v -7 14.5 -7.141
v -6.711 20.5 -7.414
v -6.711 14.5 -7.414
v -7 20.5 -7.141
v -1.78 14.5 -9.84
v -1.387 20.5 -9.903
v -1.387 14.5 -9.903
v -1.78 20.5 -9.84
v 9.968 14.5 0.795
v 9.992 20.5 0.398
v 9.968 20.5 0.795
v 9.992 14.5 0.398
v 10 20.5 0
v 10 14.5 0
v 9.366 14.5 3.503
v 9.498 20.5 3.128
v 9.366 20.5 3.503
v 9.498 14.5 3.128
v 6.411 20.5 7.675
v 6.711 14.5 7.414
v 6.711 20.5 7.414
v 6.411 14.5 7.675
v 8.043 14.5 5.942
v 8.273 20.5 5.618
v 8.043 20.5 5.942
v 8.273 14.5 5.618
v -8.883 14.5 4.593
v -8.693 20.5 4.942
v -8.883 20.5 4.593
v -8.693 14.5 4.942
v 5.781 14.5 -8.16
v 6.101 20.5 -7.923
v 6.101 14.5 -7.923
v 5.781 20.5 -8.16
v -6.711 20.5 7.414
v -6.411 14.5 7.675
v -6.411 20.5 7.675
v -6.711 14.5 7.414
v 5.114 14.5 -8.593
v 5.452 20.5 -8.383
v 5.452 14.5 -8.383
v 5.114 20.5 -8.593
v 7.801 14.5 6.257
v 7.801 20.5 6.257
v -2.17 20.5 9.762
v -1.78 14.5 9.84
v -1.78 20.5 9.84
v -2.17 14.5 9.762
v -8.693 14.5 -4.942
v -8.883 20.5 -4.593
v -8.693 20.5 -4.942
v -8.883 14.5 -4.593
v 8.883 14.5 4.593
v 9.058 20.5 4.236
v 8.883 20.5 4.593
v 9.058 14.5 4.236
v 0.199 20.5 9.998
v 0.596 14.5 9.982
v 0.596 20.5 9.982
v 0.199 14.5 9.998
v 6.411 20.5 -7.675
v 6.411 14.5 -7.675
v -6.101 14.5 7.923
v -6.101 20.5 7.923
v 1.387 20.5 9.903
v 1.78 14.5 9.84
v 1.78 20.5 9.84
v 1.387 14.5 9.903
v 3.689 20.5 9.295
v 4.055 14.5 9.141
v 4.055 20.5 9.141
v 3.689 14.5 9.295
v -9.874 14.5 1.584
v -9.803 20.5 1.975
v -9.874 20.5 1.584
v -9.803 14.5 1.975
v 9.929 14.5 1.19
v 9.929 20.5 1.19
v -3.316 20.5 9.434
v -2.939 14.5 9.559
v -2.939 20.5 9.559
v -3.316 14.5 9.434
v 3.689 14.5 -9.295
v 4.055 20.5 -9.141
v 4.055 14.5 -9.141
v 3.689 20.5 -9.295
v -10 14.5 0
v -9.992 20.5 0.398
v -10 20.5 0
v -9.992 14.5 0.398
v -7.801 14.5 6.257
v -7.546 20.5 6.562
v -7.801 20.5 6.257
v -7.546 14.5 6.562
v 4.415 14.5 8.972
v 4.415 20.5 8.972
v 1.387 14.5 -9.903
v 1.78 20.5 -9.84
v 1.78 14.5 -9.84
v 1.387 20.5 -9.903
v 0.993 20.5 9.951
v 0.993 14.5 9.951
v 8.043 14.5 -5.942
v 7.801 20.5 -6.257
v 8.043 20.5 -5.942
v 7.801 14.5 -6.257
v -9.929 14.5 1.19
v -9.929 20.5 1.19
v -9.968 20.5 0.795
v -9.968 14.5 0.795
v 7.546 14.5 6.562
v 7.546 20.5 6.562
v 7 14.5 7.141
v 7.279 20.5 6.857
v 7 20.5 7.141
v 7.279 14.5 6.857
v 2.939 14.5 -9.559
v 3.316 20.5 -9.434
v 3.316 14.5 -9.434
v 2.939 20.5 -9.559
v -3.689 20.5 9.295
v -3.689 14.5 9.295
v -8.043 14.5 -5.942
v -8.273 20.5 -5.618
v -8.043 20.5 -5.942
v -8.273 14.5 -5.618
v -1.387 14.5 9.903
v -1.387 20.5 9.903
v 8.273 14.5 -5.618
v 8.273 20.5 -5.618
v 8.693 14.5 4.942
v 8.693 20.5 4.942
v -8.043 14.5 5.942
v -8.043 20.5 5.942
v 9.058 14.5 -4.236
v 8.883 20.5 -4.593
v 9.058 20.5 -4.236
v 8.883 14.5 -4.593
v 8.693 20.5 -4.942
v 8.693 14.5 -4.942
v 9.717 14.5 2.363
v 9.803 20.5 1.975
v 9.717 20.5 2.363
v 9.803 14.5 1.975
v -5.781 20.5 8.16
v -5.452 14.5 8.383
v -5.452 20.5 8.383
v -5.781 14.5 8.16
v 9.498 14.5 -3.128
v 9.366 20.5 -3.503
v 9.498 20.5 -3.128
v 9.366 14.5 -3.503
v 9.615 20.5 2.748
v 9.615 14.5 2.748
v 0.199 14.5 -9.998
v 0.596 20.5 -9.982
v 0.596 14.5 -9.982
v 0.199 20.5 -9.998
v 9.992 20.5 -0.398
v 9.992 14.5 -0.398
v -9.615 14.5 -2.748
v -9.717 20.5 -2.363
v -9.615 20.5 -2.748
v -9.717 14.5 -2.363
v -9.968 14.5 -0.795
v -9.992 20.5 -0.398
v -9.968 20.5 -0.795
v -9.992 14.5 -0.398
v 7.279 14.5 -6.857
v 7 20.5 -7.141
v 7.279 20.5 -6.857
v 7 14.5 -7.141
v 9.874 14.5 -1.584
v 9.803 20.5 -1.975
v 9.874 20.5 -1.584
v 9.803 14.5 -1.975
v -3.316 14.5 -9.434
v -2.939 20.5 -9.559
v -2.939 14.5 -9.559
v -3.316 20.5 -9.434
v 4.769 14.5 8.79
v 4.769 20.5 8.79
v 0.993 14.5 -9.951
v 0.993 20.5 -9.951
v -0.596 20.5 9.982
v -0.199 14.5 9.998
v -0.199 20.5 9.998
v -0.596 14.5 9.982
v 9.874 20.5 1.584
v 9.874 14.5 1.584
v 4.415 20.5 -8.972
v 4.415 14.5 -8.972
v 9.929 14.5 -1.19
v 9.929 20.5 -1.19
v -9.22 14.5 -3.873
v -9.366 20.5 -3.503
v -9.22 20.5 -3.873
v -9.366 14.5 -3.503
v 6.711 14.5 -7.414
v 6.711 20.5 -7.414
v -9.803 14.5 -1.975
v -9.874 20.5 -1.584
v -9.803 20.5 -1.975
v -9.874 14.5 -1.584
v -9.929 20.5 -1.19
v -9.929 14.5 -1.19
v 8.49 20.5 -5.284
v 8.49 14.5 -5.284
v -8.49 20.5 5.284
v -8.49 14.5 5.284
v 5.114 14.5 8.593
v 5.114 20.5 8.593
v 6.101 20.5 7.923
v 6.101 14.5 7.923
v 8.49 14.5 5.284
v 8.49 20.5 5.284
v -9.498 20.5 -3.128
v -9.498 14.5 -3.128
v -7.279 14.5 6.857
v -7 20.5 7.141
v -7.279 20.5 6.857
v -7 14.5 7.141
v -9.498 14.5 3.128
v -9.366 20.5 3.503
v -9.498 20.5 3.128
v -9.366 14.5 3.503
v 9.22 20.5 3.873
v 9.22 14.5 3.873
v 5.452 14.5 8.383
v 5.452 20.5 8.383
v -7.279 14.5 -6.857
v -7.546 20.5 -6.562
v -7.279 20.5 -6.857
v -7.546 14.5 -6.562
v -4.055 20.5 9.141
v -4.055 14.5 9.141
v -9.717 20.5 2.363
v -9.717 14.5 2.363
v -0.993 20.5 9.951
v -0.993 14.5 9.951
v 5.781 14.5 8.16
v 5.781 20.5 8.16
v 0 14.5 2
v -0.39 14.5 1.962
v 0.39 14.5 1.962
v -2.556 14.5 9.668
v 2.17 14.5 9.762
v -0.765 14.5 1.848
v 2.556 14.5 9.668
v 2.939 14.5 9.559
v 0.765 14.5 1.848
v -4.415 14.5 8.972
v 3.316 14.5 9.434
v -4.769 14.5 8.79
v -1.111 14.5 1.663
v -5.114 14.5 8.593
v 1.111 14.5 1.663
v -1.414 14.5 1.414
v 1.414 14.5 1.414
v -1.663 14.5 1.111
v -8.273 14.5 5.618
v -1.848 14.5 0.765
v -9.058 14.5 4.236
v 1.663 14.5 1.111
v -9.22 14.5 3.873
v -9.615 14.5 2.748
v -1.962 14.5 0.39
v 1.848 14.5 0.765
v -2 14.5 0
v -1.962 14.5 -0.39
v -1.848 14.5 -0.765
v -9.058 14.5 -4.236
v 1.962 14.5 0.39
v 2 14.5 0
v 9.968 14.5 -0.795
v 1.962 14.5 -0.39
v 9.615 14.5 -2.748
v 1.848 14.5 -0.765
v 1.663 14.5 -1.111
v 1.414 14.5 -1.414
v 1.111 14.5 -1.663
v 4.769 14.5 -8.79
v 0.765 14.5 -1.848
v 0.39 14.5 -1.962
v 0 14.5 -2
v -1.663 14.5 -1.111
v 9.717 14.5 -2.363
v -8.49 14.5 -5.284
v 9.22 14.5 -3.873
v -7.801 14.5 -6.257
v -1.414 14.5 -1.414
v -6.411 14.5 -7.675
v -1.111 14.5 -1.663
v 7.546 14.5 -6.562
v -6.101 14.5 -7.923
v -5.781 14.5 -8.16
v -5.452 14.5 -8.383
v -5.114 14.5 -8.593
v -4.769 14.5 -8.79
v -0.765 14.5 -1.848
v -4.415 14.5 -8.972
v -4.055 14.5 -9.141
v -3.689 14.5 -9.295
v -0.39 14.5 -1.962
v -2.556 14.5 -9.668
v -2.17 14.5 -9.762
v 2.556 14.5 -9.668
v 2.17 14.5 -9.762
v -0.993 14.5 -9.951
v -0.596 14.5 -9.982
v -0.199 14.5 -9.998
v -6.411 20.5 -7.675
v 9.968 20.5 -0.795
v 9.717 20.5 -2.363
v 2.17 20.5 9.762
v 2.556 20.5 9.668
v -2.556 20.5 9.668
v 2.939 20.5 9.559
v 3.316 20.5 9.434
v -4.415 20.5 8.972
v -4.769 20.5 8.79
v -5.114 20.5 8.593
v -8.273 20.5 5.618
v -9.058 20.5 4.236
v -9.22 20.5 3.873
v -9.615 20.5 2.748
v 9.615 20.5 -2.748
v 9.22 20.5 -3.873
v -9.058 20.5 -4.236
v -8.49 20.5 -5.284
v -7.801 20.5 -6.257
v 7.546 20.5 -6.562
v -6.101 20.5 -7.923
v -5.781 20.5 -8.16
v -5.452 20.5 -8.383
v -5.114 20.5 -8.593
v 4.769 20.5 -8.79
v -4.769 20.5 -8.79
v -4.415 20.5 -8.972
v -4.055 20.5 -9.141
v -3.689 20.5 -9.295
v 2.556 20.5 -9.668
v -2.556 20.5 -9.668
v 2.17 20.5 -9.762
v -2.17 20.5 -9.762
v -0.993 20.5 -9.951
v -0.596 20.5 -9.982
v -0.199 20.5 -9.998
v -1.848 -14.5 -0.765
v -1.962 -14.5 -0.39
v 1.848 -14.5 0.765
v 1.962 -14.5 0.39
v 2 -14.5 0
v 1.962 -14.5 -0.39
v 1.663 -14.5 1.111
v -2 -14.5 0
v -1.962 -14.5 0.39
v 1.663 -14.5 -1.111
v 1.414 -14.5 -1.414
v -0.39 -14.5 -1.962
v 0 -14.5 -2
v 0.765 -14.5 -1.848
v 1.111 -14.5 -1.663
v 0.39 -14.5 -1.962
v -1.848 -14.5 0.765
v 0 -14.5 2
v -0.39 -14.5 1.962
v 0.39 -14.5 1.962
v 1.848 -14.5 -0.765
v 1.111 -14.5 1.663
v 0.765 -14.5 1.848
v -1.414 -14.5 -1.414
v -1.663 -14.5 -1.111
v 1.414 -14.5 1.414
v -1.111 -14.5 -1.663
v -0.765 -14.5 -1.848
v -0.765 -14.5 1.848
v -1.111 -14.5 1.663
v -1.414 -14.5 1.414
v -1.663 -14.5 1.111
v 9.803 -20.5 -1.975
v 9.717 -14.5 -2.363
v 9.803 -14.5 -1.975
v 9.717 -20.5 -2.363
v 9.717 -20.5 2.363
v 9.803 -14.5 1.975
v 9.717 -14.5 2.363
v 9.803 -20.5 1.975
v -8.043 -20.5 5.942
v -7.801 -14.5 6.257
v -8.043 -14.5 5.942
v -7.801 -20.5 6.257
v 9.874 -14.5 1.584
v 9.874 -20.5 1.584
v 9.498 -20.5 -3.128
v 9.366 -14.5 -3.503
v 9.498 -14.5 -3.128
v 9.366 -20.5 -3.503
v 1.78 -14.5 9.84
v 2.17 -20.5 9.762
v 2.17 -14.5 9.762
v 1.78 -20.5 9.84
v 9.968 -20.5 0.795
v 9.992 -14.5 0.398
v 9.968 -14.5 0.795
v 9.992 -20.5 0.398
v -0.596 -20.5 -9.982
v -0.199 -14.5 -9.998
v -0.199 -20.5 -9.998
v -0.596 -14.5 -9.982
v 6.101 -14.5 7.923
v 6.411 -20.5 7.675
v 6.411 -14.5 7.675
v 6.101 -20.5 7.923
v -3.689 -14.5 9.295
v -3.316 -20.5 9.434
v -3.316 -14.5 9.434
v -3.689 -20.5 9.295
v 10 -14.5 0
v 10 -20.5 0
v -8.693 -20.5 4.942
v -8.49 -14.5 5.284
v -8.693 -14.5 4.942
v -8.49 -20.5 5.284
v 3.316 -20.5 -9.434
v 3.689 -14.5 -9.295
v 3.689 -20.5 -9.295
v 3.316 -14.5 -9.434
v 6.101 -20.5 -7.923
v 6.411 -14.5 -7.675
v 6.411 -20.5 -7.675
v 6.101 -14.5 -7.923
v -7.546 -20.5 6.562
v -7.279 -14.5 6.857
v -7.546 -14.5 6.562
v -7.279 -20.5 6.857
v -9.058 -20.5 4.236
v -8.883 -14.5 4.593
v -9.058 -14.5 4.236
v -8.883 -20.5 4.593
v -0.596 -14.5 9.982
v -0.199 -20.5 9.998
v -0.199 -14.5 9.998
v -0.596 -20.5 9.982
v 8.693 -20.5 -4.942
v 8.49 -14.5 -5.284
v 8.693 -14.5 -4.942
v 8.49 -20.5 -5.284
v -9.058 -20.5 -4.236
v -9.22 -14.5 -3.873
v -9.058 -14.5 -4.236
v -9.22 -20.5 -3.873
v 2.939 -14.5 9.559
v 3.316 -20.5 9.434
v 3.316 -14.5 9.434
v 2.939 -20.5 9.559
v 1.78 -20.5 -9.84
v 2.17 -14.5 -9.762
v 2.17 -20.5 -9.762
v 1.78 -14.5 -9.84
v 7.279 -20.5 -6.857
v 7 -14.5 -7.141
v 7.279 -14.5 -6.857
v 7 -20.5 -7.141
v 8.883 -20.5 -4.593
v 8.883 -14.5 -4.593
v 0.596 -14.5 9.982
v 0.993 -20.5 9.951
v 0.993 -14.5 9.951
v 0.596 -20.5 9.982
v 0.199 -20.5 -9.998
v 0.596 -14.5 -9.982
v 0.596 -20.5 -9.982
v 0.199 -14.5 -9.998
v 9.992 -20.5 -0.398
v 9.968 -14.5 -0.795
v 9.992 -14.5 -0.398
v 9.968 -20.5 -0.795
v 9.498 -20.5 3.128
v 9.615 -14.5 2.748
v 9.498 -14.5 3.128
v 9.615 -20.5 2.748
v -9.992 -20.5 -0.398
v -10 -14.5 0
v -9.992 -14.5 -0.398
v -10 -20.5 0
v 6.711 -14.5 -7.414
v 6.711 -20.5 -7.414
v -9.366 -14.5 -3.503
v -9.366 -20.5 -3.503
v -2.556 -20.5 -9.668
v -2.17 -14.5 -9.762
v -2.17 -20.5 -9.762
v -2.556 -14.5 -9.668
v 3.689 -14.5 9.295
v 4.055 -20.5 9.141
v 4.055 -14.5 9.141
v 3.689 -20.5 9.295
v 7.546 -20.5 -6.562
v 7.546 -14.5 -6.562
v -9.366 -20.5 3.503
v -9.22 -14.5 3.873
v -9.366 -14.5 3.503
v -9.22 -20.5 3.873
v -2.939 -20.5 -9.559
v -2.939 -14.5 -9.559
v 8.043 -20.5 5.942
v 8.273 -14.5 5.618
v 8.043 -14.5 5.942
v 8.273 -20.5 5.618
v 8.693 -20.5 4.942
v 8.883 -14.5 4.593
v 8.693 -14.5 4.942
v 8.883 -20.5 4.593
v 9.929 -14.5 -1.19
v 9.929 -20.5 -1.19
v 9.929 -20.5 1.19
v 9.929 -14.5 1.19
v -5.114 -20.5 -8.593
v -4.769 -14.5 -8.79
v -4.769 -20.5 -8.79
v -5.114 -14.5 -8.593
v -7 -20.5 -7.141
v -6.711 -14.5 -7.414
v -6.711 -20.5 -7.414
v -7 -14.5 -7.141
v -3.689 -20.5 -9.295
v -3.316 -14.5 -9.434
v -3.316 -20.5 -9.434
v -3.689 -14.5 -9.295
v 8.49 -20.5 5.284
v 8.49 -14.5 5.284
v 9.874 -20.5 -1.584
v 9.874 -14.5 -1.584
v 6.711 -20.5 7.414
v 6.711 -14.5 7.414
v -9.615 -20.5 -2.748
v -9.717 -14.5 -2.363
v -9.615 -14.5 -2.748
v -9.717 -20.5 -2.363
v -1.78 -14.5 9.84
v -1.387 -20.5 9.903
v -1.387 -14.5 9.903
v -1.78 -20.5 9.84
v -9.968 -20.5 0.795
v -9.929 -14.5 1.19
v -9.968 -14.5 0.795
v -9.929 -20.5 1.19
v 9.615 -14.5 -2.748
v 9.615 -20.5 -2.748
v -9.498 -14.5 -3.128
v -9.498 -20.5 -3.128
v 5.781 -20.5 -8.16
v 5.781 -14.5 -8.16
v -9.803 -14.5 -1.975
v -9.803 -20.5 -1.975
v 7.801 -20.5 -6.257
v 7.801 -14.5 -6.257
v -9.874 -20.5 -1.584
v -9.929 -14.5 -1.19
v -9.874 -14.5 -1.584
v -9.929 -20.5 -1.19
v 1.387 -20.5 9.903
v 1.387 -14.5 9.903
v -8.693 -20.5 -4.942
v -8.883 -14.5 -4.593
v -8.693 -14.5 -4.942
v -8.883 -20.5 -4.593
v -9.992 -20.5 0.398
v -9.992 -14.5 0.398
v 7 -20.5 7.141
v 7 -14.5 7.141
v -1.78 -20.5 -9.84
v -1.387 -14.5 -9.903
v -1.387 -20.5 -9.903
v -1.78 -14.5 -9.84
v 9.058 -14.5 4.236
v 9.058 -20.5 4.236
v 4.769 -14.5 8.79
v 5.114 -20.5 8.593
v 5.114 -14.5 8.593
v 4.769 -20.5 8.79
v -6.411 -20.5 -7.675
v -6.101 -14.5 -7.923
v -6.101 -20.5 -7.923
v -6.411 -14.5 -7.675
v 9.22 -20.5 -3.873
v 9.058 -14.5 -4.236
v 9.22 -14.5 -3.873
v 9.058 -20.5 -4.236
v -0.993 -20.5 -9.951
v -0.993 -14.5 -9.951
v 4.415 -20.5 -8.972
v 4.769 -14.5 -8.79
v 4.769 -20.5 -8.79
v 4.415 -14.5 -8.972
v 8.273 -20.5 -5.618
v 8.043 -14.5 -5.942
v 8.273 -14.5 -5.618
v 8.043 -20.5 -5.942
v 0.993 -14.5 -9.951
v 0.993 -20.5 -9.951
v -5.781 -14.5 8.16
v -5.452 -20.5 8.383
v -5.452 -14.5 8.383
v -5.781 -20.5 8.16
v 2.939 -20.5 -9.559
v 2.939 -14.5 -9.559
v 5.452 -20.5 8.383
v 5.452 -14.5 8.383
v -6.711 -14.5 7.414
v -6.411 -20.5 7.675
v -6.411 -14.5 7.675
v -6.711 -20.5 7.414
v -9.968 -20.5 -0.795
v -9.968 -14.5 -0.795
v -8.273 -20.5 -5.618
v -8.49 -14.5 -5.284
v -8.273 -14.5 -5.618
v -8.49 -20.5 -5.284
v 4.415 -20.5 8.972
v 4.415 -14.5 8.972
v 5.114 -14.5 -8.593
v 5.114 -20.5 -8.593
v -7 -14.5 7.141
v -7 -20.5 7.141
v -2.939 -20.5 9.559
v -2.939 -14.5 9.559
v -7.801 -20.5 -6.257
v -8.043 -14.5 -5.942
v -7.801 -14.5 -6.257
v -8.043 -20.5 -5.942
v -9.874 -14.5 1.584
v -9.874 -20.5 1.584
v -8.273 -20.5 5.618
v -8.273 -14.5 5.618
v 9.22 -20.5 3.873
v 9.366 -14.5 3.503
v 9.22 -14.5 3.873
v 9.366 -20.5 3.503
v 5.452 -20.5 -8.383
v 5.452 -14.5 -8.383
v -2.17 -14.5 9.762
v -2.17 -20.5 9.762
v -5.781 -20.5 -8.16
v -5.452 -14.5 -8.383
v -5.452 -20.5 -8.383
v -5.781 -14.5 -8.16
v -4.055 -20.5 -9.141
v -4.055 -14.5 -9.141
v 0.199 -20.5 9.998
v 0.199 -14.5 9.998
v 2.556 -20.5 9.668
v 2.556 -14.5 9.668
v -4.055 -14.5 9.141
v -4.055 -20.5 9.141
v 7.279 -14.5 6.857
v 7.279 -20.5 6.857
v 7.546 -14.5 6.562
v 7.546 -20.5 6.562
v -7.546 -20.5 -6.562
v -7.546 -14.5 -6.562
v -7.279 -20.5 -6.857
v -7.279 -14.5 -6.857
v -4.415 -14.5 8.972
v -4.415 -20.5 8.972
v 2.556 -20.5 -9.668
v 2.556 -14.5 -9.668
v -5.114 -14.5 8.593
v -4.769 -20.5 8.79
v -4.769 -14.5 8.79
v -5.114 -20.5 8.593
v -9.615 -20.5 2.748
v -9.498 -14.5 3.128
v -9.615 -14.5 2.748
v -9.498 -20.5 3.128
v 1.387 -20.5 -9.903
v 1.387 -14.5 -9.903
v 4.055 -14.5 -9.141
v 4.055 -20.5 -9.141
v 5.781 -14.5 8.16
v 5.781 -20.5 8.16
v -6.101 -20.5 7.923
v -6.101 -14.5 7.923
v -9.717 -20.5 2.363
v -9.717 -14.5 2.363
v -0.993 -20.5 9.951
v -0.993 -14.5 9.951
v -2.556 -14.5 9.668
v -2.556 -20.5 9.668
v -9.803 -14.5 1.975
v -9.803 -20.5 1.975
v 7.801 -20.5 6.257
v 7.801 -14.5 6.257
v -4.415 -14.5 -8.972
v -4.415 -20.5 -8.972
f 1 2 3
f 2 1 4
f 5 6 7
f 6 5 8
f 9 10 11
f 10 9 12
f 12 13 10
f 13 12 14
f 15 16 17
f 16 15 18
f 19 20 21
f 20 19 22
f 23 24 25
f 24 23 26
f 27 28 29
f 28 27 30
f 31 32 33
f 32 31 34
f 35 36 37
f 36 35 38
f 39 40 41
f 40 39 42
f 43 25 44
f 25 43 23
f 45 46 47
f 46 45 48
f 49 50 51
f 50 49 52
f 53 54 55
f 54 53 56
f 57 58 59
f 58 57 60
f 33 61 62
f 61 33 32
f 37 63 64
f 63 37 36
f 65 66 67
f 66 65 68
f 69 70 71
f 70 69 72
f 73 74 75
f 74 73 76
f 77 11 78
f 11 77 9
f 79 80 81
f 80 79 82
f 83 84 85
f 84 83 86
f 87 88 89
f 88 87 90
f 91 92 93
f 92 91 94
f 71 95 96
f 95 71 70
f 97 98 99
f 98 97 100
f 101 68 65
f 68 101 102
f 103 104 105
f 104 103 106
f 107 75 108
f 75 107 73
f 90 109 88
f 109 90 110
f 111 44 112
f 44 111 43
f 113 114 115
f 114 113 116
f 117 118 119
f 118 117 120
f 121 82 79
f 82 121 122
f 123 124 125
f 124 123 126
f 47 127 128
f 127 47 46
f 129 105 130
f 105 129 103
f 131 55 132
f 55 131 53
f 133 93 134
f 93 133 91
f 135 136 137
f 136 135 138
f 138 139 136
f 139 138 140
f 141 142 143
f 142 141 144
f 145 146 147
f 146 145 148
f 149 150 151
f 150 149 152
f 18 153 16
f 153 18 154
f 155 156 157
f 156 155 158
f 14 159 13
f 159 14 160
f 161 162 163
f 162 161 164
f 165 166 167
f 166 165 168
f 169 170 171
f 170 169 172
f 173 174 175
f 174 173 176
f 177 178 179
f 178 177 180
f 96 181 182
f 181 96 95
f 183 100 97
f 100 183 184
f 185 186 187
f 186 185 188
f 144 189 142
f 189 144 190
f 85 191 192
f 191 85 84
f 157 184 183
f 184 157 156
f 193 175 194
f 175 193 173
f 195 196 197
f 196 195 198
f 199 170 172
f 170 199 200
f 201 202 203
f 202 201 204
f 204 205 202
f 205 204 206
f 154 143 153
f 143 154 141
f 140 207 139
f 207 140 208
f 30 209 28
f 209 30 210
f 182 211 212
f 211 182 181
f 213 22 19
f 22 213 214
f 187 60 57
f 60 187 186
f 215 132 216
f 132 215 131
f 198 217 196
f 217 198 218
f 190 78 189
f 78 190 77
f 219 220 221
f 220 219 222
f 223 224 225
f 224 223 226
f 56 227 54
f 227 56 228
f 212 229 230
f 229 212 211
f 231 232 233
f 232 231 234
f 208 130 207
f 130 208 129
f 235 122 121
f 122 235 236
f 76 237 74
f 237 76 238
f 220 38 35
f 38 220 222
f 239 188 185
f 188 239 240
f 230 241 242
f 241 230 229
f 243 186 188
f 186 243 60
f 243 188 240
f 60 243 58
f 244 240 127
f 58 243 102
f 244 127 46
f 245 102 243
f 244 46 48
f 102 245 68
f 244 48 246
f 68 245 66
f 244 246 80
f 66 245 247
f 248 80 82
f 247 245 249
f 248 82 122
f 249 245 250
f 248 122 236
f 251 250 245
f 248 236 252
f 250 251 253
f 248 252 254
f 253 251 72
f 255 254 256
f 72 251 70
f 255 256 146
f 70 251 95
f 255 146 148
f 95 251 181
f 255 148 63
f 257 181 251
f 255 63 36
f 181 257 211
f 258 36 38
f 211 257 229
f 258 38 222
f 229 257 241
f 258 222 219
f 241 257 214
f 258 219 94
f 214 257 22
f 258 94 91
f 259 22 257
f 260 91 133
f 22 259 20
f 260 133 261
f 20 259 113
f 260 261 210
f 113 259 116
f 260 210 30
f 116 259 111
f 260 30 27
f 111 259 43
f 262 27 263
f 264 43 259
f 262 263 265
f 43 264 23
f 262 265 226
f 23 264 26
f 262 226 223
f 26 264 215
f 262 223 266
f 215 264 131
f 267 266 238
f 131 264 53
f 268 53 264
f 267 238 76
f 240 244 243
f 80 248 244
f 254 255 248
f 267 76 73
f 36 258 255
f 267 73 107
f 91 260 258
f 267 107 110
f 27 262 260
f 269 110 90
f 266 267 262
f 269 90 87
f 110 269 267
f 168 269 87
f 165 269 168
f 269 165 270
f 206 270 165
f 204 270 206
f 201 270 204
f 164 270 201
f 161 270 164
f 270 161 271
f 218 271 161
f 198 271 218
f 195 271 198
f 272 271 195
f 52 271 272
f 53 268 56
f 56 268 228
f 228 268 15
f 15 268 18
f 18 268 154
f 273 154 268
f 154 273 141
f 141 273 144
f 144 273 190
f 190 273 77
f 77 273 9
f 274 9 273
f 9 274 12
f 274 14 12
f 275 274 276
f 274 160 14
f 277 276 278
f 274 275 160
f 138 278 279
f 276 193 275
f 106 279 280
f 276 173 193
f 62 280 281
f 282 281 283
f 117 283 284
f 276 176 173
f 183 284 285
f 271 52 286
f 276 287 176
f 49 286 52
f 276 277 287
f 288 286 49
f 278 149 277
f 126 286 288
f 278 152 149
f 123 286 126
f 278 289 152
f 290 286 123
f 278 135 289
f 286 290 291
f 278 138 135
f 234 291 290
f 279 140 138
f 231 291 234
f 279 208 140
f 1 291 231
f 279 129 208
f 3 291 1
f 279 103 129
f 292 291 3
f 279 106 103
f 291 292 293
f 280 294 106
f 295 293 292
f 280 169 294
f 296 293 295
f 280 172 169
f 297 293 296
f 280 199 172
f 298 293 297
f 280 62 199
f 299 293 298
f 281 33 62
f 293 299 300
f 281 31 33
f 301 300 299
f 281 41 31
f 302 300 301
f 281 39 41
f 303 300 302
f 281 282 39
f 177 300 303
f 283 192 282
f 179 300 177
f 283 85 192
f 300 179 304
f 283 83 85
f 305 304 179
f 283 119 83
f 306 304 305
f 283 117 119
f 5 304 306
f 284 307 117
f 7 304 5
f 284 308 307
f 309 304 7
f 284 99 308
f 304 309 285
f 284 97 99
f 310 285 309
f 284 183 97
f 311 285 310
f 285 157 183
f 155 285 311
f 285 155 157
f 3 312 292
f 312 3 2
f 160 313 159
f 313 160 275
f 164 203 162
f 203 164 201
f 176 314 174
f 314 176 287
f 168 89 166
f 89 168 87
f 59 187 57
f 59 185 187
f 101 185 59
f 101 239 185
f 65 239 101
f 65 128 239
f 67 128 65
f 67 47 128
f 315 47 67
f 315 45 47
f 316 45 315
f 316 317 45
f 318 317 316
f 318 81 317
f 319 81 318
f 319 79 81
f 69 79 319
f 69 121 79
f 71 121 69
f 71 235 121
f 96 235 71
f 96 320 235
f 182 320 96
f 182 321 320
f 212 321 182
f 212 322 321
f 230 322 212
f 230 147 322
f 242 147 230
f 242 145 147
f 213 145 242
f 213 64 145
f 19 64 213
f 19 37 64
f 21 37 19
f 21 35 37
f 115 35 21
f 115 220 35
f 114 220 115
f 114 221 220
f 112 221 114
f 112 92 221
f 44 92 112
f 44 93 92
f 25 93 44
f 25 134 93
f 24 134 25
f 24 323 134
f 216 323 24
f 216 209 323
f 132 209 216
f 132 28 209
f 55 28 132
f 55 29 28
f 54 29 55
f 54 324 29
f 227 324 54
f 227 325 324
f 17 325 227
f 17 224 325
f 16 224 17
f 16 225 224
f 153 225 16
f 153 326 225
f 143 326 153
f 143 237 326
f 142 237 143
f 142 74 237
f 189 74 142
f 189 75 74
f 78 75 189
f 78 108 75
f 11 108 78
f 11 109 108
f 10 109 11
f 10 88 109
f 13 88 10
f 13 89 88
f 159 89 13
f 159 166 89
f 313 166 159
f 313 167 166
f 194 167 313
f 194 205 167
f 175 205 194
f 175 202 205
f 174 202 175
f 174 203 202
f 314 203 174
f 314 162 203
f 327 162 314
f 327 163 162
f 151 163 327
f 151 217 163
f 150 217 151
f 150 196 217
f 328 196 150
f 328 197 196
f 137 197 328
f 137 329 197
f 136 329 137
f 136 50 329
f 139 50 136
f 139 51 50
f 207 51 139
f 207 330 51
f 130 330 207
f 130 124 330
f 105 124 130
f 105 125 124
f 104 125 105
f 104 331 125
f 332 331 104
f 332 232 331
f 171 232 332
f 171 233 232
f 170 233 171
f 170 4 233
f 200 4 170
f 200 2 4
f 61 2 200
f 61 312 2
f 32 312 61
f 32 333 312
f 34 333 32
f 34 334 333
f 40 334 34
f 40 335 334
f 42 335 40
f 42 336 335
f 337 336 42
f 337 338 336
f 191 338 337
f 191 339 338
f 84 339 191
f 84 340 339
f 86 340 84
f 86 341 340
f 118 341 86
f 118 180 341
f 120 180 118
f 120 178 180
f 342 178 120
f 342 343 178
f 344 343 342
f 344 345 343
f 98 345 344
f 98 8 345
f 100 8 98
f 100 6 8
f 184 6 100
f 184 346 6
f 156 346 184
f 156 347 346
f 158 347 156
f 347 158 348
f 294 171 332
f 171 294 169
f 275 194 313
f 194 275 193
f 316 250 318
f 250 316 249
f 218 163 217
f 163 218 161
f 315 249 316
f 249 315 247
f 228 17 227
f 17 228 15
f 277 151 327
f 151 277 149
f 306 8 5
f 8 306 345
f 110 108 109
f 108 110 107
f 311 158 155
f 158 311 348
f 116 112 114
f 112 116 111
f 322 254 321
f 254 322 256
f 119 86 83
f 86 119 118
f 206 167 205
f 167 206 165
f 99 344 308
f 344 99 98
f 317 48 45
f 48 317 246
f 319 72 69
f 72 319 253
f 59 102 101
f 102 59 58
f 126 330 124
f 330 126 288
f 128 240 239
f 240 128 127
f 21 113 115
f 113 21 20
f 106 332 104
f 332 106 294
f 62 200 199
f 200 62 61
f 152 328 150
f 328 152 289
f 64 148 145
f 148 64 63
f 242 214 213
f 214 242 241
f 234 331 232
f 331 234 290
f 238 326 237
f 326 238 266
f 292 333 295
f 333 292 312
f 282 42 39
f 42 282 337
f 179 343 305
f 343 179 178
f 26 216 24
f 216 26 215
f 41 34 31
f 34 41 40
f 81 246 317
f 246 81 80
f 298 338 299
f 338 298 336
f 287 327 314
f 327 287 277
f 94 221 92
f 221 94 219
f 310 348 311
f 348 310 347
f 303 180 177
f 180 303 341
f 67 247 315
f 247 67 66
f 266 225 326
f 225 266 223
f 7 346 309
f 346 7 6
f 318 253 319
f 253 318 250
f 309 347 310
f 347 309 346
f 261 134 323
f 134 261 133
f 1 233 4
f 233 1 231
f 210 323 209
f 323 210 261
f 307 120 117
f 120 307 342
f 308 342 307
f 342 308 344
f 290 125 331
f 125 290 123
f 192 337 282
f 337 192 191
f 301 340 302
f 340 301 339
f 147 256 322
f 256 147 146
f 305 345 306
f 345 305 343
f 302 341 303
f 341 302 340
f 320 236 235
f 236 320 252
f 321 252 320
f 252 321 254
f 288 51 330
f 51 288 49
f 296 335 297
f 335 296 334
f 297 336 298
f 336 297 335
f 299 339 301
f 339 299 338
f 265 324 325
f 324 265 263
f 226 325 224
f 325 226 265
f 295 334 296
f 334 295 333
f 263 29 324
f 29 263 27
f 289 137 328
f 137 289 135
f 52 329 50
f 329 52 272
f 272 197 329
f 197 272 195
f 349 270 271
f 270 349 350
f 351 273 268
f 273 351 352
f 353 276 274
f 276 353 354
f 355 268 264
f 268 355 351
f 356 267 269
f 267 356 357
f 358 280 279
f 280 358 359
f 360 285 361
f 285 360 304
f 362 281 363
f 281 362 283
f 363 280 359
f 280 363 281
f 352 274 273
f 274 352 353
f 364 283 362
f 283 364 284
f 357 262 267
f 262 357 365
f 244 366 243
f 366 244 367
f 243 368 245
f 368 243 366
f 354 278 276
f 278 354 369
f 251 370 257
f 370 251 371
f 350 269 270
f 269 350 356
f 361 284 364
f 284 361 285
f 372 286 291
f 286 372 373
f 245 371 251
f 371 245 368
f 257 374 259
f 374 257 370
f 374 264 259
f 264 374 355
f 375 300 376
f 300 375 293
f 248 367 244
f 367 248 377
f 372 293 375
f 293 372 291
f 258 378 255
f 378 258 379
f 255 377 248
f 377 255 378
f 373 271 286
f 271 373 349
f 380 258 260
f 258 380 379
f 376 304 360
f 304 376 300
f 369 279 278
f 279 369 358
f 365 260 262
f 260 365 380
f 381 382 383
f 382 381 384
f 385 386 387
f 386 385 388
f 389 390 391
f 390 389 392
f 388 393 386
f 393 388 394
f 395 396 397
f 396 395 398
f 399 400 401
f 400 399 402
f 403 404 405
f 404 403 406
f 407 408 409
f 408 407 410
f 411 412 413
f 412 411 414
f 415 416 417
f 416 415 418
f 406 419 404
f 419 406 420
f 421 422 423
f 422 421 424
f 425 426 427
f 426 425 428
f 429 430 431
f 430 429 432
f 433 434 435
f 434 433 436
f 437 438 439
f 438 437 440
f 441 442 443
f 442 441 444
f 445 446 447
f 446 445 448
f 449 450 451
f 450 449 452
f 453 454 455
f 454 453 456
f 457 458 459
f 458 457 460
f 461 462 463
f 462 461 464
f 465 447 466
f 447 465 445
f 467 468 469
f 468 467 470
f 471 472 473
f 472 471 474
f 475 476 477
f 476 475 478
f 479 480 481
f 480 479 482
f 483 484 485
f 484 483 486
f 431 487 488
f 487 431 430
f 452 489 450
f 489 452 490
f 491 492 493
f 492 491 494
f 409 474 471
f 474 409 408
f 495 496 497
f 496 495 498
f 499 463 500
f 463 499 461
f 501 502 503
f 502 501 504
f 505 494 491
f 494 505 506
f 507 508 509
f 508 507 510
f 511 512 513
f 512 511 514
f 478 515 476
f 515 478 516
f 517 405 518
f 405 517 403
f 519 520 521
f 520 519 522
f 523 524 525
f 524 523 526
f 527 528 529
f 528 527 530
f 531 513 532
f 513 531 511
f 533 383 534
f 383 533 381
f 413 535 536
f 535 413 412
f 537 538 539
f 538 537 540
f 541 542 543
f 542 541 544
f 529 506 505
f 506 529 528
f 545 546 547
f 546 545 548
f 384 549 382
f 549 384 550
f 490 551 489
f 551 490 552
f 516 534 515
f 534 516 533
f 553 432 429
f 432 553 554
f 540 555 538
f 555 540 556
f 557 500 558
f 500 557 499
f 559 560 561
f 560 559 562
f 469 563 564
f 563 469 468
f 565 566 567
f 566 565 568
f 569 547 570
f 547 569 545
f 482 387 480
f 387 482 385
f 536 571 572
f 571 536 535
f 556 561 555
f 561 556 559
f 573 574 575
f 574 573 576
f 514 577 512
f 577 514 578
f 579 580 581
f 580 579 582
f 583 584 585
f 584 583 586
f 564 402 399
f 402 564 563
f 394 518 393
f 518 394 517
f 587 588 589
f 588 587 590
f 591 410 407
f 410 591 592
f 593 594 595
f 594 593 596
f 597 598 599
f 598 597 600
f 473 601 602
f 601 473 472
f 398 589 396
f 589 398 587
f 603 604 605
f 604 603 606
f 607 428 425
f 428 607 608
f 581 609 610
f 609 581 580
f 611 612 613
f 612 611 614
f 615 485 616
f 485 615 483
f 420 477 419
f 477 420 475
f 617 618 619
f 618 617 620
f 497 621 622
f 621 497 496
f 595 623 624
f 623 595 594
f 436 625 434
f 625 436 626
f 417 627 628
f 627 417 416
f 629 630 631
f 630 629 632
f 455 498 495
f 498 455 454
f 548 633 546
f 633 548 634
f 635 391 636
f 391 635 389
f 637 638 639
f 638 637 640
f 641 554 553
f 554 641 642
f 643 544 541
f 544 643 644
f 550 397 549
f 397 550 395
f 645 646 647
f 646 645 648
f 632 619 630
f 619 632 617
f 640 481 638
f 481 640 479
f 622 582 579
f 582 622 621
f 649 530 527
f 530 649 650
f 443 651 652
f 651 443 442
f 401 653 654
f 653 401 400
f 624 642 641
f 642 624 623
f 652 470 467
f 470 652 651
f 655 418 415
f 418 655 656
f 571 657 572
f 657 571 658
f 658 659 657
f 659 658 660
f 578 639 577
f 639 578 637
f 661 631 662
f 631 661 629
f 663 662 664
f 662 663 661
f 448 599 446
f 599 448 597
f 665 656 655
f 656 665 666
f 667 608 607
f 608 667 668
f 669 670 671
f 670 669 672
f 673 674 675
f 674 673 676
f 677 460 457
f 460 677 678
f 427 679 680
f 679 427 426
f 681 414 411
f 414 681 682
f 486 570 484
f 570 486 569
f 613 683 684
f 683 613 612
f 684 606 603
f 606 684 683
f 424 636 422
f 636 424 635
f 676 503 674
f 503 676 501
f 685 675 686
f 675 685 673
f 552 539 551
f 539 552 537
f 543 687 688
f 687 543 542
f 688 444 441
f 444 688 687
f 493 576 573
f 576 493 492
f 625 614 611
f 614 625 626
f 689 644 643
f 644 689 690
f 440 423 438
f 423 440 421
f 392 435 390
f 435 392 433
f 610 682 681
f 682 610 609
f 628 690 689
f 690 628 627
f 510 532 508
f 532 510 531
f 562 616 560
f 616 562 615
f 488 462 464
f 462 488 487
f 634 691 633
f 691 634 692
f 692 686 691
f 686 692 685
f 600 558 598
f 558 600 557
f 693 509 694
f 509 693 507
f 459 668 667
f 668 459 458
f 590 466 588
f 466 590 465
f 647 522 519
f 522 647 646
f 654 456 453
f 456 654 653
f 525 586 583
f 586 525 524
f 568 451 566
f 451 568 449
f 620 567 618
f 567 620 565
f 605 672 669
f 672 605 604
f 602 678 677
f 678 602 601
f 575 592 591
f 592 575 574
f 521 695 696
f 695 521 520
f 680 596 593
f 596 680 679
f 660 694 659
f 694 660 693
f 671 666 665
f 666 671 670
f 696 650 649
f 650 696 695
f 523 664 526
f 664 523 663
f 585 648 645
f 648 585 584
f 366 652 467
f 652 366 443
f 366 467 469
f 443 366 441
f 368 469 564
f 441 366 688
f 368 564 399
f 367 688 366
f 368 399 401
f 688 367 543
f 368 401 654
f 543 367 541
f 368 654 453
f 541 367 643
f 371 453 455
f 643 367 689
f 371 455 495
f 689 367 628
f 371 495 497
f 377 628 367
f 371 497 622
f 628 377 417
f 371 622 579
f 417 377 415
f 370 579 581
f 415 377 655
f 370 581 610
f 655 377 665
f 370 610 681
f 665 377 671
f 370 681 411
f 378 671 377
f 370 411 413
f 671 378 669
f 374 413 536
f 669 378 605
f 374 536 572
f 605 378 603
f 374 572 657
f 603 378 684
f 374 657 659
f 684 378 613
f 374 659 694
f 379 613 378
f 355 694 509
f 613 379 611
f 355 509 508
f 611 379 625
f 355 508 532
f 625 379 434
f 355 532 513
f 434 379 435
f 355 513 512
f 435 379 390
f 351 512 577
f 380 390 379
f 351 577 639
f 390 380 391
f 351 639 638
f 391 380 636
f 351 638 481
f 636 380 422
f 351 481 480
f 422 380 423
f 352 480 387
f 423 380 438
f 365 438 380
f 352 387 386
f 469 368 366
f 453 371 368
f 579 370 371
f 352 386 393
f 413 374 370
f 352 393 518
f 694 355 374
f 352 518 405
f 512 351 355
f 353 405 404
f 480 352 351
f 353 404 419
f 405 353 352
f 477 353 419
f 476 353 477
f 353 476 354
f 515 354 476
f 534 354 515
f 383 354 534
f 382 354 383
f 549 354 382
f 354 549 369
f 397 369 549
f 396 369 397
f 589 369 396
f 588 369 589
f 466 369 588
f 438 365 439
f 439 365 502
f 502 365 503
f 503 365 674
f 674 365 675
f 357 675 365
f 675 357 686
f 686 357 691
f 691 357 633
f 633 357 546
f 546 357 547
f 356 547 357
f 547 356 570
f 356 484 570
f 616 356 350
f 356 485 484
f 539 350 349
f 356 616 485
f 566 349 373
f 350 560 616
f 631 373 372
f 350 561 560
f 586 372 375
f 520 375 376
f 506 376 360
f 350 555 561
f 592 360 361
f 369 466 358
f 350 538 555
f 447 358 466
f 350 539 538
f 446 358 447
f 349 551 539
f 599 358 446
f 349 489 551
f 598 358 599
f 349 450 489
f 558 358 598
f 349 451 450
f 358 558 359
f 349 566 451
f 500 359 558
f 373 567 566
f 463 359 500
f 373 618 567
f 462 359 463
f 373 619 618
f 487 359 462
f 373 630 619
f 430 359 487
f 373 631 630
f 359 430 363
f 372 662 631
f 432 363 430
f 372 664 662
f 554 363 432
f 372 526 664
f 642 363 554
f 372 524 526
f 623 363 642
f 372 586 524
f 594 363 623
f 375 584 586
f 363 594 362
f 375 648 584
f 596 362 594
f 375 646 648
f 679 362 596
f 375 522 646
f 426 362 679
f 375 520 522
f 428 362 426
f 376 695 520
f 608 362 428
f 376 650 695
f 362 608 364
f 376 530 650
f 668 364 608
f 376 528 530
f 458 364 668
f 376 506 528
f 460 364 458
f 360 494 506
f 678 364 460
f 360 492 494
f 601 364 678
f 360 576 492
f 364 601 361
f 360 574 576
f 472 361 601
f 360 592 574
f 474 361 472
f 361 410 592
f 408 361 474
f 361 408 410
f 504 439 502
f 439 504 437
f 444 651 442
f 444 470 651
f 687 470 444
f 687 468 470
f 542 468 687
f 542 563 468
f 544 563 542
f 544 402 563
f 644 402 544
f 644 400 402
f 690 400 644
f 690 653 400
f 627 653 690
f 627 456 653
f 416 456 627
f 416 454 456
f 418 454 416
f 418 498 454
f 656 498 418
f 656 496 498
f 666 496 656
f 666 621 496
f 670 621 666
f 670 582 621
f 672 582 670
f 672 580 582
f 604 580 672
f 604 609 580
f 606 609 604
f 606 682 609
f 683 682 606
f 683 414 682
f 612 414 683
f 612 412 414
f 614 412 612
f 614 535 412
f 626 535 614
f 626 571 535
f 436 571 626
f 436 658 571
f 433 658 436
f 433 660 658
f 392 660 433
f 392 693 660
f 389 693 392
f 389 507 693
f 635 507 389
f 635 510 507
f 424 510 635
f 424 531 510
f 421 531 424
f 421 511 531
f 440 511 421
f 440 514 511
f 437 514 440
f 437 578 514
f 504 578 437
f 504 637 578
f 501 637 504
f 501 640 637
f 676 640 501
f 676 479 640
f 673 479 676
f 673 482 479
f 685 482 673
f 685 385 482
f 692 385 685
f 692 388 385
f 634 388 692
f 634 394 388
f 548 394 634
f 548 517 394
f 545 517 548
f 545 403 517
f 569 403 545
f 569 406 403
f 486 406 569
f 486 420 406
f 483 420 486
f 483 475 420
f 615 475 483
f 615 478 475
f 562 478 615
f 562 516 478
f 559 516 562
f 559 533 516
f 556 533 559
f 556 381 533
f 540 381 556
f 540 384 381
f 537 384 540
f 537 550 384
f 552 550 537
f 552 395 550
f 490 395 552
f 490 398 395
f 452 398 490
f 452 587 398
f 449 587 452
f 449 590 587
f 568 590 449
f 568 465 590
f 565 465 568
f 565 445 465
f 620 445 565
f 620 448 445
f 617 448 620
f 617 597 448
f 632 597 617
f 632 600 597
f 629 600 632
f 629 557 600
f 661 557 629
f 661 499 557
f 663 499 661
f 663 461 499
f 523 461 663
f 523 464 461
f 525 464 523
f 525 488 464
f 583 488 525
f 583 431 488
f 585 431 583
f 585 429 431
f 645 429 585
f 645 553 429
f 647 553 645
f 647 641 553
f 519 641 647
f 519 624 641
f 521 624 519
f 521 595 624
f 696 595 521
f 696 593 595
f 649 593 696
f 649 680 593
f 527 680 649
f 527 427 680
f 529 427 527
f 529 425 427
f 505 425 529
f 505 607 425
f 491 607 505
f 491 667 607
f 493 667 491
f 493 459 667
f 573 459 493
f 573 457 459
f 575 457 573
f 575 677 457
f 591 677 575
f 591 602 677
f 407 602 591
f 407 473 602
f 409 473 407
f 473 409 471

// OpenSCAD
// file: vehicle_parts.scad
module simple_wheel(wheel_radius=10, wheel_width=6) {
    rotate([90,0,0])
        cylinder(h=wheel_width,r=wheel_radius,center=true);
}

module complex_wheel(wheel_radius=10, side_spheres_radius=50, hub_thickness=4, cylinder_radius=2) {
    cylinder_height=2*wheel_radius;  
    difference() {  
        // Wheel sphere  
        sphere(r=wheel_radius);  
        // Side sphere 1  
        translate([0,side_spheres_radius + hub_thickness/2,0])
            sphere(r=side_spheres_radius);  
        // Side sphere 2  
        translate([0,- (side_spheres_radius + hub_thickness/2),0])
            sphere(r=side_spheres_radius);  
        // Cylinder 1  
        translate([wheel_radius/2,0,0])
            rotate([90,0,0])
            cylinder(h=cylinder_height,r=cylinder_radius,center=true);  
        // Cylinder 2  
        translate([0,0,wheel_radius/2])
            rotate([90,0,0])
            cylinder(h=cylinder_height,r=cylinder_radius,center=true);  
        // Cylinder 3  
        translate([-wheel_radius/2,0,0])
            rotate([90,0,0])
            cylinder(h=cylinder_height,r=cylinder_radius,center=true);  
        // Cylinder 4  
        translate([0,0,-wheel_radius/2])
            rotate([90,0,0])
            cylinder(h=cylinder_height,r=cylinder_radius,center=true);  
    }
}

module body(base_height=10, top_height=14, base_length=60, top_length=30, width=20, top_offset=5) {
    // Car body base
    cube([base_length,width,base_height],center=true);
    // Car body top
    translate([top_offset,0,base_height/2+top_height/2 - 0.001])
        cube([top_length,width,top_height],center=true);
}

module axle(track=35, radius=2) {
    rotate([90,0,0])
        cylinder(h=track,r=2,center=true);
}
// main file
use <vehicle_parts.scad>
$fa = 1;
$fs = 0.4;
module axle_wheelset(wheel_radius=10, wheel_width=6, track=35, radius=2) {
    translate([0,track/2,0])
        simple_wheel(wheel_radius=wheel_radius, wheel_width=wheel_width);
    axle(track=track, radius=radius);
    translate([0,-track/2,0])
        simple_wheel(wheel_radius=wheel_radius, wheel_width=wheel_width);
}
axle_wheelset();
